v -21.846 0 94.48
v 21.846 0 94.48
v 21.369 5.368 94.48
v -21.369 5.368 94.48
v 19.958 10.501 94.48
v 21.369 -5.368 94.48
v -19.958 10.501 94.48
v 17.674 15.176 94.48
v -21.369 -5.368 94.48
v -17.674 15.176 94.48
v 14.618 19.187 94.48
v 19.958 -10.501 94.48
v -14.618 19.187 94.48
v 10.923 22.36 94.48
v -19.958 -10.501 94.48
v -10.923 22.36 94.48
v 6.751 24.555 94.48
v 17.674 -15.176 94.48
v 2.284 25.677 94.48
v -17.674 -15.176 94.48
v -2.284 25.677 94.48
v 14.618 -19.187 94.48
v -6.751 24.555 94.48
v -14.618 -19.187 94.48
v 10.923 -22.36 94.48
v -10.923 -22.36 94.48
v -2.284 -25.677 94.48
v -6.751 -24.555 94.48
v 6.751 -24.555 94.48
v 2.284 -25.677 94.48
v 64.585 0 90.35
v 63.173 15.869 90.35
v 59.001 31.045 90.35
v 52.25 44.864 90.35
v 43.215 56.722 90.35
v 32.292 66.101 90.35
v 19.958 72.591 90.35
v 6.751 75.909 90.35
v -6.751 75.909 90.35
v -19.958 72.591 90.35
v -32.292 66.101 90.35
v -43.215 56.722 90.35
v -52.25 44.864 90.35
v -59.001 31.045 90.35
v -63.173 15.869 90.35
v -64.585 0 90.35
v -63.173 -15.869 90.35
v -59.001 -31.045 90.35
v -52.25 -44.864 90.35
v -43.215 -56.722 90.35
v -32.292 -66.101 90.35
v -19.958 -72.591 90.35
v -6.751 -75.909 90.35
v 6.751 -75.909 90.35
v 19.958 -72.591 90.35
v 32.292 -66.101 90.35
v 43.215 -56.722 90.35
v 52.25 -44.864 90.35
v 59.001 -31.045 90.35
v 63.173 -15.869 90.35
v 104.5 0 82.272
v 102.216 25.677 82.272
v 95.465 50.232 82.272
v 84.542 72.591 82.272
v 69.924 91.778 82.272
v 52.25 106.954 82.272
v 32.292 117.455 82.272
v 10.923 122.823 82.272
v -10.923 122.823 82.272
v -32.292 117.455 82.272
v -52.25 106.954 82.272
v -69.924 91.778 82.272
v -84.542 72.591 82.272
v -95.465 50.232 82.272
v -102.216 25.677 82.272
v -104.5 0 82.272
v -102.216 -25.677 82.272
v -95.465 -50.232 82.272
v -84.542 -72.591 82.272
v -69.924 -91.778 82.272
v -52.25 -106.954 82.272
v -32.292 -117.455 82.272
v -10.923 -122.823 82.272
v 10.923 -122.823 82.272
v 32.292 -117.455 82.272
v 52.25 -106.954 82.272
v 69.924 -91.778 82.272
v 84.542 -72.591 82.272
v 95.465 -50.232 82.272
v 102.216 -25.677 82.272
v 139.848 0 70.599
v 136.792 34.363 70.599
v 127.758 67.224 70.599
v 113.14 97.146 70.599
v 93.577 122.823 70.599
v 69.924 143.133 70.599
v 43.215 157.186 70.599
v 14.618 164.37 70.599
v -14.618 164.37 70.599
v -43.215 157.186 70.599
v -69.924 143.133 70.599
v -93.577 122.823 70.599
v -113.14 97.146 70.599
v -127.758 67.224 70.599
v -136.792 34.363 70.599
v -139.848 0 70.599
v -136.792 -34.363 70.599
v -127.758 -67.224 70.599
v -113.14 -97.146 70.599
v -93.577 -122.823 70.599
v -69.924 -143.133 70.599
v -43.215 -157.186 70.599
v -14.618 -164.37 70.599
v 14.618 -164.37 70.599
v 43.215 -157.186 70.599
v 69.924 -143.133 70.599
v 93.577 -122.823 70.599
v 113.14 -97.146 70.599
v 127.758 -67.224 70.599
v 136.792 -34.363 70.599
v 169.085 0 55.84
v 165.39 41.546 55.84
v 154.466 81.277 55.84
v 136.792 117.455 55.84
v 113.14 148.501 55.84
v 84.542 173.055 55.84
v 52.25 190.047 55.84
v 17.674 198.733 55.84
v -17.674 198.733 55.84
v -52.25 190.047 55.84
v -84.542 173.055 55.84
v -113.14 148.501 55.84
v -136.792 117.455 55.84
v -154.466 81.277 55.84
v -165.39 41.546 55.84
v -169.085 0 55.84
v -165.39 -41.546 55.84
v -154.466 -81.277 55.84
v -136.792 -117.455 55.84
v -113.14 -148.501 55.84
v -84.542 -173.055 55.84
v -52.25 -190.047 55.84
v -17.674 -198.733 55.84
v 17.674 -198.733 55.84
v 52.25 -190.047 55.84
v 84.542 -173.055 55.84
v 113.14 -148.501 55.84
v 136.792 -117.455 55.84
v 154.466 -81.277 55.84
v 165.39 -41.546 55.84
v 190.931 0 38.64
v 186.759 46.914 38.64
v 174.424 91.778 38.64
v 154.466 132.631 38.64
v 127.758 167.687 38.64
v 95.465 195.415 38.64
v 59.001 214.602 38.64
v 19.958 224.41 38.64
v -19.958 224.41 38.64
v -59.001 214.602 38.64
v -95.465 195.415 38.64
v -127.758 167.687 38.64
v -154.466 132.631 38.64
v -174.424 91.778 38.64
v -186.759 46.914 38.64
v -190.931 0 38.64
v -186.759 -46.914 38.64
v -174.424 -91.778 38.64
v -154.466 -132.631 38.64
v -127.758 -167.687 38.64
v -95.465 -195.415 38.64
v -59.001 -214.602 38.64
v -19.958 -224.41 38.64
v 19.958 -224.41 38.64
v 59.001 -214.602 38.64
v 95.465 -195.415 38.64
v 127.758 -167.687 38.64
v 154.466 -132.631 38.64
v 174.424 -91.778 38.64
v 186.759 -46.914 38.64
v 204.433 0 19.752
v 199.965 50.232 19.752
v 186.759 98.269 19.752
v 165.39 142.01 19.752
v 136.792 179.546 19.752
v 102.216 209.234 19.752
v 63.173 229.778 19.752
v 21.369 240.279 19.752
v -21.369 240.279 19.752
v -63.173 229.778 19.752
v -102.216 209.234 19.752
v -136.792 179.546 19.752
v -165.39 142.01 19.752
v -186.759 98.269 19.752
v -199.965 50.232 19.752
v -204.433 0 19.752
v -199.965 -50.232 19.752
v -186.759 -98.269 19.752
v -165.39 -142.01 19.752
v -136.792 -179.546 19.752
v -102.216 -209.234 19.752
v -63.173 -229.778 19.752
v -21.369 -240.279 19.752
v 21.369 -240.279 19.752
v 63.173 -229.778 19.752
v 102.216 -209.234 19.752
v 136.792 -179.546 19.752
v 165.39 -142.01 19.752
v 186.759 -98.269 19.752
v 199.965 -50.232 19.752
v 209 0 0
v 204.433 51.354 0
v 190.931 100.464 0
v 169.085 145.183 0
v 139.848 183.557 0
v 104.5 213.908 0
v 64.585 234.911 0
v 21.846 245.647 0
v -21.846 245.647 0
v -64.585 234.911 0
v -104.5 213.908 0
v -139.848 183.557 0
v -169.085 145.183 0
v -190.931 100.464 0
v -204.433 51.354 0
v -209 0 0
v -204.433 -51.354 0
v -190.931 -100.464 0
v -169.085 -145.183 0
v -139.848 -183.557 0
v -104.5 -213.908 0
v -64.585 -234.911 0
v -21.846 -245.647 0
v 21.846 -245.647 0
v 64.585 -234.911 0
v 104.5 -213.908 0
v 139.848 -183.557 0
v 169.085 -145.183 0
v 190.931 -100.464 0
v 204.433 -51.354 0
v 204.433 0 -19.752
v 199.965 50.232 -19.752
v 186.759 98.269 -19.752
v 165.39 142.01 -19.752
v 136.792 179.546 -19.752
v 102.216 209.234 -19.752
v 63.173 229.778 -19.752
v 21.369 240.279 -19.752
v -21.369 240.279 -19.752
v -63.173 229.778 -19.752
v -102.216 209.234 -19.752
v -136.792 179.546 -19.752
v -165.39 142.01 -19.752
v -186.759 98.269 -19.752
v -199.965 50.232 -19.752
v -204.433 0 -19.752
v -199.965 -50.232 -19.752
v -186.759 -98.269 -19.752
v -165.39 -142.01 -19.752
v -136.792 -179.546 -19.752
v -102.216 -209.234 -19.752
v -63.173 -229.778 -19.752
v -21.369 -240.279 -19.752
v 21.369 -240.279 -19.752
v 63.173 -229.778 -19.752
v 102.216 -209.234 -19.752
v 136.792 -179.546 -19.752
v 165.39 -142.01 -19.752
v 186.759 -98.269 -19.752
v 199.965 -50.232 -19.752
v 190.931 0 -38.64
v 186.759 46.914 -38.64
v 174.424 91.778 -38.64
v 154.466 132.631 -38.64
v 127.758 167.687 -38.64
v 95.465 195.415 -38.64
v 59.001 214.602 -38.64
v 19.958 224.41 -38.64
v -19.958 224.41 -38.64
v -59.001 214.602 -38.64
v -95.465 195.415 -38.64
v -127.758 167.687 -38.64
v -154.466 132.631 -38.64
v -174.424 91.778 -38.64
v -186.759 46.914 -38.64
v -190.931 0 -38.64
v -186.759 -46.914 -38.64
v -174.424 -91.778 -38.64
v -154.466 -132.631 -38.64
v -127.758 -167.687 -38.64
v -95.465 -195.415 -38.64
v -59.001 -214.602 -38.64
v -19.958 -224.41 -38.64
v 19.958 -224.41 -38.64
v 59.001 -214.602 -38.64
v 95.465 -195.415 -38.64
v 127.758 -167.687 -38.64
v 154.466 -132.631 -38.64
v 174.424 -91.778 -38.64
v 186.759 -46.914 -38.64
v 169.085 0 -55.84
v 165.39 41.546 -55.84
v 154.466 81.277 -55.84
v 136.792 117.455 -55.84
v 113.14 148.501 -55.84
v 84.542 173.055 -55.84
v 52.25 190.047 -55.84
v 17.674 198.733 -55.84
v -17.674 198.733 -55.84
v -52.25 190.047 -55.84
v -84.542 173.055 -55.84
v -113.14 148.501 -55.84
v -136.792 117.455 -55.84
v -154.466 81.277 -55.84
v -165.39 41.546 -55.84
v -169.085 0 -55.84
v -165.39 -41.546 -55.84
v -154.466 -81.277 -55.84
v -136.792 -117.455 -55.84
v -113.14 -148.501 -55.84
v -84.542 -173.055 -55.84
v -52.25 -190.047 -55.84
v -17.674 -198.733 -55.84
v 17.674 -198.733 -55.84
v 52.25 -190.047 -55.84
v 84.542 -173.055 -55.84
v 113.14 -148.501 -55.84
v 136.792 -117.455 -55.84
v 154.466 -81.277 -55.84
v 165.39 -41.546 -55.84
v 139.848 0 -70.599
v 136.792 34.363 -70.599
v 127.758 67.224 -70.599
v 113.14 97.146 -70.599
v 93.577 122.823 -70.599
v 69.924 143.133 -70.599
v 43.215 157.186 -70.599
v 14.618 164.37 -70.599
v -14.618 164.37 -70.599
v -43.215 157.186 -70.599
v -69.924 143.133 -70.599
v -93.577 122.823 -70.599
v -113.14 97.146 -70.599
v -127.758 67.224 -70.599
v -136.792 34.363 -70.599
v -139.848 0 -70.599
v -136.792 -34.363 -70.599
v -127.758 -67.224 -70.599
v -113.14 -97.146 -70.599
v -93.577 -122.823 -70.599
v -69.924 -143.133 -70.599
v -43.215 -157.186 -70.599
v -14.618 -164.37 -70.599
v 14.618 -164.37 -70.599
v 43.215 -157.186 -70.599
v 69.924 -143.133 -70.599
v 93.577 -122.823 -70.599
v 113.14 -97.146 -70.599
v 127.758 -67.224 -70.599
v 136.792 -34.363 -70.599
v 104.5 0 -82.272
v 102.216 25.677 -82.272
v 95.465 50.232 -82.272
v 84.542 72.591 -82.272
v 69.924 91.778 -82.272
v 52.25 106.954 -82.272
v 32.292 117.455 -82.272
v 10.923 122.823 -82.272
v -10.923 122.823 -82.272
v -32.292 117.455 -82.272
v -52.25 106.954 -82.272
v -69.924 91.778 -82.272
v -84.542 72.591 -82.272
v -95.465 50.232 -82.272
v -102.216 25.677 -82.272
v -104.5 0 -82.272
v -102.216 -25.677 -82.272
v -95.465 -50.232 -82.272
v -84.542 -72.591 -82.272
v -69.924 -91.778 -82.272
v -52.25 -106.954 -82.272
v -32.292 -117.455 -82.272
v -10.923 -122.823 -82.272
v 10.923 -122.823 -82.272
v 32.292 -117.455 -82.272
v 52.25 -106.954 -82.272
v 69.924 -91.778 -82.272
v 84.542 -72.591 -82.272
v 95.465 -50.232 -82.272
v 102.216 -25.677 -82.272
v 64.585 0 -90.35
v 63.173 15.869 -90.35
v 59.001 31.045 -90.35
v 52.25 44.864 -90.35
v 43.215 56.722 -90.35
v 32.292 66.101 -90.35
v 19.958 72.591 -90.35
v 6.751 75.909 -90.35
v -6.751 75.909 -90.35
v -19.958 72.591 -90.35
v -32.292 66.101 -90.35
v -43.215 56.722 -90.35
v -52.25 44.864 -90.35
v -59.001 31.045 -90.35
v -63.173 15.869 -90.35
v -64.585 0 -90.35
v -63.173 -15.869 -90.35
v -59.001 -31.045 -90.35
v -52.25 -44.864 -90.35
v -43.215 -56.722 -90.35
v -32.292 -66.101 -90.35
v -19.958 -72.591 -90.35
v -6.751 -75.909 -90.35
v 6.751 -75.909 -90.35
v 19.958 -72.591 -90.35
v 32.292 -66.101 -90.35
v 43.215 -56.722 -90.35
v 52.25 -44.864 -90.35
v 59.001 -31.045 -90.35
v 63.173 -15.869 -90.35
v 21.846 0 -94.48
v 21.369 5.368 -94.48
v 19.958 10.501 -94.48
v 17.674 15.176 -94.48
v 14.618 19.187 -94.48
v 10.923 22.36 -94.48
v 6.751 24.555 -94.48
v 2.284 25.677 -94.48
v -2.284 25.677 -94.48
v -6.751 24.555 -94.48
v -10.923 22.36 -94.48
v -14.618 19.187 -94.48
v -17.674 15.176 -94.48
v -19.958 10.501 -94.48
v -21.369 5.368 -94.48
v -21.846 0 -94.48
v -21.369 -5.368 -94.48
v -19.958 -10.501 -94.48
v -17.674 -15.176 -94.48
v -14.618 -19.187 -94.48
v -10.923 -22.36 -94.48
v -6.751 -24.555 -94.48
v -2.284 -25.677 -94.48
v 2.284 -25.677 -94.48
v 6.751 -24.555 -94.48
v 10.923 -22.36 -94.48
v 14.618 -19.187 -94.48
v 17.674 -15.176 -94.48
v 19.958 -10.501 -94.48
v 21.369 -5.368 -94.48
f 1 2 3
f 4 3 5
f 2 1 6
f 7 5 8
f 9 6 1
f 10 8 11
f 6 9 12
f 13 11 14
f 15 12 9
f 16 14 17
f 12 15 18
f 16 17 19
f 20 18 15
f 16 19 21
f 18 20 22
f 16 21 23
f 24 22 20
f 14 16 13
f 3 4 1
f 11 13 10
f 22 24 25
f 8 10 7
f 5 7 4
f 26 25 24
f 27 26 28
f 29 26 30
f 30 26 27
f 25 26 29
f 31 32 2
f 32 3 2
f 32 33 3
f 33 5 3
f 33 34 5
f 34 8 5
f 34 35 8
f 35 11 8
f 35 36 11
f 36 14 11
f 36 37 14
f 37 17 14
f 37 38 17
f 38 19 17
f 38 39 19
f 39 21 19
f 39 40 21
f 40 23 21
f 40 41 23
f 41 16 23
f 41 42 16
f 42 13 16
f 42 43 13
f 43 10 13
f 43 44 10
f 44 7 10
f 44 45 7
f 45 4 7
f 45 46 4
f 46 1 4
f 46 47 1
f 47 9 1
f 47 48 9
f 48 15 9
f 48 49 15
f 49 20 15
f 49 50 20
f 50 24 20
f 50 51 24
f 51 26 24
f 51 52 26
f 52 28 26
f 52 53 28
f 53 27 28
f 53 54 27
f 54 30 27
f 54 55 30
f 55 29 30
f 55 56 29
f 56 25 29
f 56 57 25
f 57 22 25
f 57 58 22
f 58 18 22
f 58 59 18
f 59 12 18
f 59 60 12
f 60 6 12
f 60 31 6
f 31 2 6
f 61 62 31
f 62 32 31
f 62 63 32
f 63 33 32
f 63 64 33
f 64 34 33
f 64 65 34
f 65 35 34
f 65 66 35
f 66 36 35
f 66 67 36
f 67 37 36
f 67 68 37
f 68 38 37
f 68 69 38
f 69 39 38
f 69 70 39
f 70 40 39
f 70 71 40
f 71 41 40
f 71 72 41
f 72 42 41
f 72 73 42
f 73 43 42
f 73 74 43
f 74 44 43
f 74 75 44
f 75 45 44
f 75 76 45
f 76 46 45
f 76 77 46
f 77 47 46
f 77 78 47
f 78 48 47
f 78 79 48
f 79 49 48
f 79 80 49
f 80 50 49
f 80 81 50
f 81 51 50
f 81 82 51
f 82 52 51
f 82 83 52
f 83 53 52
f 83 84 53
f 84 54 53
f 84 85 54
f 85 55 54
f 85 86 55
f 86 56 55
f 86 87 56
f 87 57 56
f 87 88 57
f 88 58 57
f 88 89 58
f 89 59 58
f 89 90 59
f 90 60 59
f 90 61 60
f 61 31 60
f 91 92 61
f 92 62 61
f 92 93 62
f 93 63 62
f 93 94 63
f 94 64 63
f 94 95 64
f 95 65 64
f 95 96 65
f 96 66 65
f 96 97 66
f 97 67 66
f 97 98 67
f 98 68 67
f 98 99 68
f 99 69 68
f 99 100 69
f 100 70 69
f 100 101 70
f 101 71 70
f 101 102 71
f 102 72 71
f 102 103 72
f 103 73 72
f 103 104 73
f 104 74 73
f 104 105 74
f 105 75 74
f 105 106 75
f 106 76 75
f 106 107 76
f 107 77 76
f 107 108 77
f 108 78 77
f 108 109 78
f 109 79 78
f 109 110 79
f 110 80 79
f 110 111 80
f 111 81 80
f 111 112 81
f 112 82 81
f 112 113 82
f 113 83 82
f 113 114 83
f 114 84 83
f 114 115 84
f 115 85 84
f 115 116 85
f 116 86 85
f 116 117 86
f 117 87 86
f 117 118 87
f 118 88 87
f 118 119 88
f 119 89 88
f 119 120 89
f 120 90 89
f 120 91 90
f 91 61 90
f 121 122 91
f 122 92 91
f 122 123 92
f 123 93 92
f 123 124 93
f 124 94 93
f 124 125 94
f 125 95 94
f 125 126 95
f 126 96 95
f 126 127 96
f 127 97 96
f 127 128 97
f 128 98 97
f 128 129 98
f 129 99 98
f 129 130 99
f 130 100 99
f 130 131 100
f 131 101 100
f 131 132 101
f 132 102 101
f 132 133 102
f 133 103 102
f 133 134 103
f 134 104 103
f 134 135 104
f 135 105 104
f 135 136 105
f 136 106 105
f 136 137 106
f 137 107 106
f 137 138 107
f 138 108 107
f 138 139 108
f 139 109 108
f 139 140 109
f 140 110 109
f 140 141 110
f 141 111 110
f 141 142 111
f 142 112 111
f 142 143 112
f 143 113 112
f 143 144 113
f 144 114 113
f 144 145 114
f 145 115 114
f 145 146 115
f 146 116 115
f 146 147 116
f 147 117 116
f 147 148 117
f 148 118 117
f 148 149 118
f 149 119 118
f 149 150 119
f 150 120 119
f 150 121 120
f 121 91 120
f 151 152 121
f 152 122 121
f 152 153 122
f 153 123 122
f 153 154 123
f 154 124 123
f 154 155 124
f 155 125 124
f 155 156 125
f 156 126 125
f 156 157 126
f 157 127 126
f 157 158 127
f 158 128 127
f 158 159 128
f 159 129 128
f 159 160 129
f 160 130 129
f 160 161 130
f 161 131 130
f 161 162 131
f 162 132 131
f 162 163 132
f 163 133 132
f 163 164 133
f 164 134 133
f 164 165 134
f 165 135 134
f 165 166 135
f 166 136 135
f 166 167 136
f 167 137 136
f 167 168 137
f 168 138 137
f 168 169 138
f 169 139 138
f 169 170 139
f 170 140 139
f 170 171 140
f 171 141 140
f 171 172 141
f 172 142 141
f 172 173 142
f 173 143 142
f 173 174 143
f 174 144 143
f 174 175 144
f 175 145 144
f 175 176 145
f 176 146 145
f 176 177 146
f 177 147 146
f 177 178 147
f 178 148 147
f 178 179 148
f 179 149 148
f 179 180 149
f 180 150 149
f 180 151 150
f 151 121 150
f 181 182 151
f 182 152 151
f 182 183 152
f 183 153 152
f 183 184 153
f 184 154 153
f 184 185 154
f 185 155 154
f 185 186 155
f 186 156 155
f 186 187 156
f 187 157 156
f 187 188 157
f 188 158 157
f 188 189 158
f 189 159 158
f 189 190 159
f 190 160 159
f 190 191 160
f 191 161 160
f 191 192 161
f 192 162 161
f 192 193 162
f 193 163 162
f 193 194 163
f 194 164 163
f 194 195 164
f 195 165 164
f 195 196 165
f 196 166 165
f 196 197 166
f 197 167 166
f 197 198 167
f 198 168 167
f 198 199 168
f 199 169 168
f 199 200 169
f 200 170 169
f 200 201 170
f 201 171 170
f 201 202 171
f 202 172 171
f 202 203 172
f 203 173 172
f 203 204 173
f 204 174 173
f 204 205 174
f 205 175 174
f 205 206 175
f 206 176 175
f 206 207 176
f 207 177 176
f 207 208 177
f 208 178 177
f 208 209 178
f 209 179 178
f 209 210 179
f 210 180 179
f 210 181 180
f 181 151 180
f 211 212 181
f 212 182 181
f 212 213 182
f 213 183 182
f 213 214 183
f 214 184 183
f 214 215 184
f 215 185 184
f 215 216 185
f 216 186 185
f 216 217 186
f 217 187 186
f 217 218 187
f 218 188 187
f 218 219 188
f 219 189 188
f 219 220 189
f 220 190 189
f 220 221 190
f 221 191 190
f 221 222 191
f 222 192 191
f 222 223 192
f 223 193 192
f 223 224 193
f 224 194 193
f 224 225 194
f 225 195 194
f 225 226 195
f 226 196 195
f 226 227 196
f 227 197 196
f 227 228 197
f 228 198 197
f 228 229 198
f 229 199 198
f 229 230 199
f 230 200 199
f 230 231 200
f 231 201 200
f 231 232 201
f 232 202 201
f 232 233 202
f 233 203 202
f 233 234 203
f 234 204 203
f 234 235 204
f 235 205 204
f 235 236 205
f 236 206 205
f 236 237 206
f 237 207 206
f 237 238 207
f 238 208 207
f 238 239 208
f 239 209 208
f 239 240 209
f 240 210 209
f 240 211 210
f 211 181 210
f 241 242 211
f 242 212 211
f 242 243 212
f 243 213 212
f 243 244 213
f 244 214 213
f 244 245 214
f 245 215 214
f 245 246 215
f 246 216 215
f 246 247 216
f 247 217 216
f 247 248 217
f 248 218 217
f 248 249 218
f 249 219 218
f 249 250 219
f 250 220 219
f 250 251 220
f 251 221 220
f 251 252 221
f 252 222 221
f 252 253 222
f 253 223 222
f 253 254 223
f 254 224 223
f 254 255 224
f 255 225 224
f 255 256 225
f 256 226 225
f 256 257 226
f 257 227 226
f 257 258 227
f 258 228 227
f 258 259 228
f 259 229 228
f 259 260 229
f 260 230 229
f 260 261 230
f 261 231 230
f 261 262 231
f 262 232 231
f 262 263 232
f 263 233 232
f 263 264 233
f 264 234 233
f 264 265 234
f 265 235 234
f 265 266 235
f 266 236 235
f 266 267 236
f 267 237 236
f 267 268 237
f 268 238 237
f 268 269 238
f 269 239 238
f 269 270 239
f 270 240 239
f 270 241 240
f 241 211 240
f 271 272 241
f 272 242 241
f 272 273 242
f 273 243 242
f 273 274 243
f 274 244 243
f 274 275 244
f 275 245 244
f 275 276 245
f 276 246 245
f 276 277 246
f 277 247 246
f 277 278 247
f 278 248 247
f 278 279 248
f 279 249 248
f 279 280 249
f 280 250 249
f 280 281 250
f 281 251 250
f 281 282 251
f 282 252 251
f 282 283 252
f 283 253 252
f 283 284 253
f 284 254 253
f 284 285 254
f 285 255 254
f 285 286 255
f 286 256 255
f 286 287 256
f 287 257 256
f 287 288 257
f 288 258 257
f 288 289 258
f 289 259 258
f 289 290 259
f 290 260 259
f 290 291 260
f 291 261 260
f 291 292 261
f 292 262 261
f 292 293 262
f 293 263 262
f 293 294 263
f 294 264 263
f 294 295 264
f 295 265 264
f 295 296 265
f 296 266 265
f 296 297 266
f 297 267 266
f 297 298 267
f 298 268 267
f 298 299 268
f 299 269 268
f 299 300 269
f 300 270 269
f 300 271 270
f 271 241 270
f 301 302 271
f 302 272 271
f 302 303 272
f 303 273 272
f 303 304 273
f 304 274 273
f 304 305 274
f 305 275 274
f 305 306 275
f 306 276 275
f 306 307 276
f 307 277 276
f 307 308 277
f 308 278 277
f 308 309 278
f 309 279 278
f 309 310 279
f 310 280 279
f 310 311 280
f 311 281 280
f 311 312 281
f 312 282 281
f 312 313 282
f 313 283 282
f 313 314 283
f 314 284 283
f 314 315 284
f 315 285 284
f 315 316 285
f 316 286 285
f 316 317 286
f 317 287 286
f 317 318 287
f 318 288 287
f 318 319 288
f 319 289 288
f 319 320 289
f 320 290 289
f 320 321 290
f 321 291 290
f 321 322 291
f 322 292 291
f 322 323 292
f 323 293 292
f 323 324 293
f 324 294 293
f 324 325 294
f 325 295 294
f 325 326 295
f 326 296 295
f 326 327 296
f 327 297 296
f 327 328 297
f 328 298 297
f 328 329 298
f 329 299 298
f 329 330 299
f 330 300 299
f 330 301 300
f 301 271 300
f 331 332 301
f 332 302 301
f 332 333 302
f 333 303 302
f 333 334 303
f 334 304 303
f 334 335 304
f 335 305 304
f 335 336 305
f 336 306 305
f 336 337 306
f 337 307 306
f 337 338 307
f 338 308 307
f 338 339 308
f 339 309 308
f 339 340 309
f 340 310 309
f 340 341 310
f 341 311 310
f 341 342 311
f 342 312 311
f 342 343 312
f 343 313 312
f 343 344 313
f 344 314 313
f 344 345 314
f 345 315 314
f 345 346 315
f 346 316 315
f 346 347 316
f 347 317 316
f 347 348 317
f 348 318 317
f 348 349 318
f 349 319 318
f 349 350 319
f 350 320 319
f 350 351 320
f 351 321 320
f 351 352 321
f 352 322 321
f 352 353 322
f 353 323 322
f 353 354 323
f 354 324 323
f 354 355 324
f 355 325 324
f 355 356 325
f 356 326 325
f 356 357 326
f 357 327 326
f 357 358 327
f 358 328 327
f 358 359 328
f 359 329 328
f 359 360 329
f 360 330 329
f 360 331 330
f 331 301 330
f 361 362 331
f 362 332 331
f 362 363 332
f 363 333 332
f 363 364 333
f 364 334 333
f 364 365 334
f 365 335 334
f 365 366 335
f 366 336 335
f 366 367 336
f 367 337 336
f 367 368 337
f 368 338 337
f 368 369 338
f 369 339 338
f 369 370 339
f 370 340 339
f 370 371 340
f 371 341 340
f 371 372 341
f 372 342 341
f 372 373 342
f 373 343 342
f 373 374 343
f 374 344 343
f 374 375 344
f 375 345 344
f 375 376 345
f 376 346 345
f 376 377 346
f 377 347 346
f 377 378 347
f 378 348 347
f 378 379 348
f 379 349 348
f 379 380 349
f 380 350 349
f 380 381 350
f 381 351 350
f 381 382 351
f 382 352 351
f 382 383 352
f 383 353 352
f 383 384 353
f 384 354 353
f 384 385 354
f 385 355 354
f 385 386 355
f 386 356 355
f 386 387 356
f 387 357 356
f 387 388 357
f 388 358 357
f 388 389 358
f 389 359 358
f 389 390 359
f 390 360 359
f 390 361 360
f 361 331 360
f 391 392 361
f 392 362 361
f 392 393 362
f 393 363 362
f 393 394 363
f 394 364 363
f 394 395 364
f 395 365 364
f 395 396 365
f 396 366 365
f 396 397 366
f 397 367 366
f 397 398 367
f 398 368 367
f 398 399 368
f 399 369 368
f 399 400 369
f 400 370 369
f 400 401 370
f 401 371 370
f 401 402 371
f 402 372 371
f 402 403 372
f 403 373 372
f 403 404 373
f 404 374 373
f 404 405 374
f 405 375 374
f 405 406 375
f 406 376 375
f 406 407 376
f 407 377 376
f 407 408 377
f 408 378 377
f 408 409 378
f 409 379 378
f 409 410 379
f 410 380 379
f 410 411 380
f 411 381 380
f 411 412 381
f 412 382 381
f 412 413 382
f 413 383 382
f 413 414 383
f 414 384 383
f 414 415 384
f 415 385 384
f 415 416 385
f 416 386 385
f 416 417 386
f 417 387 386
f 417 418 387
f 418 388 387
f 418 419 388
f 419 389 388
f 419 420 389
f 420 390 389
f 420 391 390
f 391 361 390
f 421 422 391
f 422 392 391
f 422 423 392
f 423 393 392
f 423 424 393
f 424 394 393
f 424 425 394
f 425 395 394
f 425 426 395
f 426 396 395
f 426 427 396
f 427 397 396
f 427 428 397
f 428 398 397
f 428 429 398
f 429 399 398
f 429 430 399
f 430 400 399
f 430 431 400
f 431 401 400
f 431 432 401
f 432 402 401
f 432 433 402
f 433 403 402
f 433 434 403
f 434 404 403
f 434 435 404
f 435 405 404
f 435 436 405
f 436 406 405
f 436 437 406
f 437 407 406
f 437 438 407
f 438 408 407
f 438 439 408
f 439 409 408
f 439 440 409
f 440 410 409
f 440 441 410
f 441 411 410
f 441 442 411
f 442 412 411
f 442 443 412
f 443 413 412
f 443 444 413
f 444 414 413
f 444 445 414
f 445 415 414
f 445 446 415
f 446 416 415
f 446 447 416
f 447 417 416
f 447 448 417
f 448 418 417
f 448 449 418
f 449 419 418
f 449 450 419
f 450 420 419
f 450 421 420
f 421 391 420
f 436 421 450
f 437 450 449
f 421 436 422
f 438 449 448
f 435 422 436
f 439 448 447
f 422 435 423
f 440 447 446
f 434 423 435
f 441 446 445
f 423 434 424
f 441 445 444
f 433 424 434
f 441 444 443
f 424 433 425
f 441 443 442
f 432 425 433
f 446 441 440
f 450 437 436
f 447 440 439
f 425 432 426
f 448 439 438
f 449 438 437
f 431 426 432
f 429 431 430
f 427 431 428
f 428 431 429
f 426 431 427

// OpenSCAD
// Generated by SolidPython 1.0.1 on 2020-07-29 00:46:49


scale(v = [11, 13, 5]) {
	sphere(r = 19);
}
/***********************************************
*********      SolidPython code:      **********
************************************************
 
# import packages: SolidPython
from solid import *
from solid.utils import *
from itertools import chain, combinations, permutations


class Resize:

    def __init__(self, scad_file):
        self.scad_file = scad_file
        #self.scad_file = import_scad(scad_file)
        # cone/cylinder param:
        self.r1 = 0
        self.r2 = 0
        self.h = 0
        # rectangular prism param:
        self.w = 0
        self.l = 0
        # ellipse param:
        self.r = 0

    # import OpenScad code (file name corresponds to shape)


    # classify shape + parameters
    def assign(self, param1, param2, param3):
        if self.scad_file == 'cone.scad':
            self.r1 = param1
            self.r2 = param2
            self.h = param3
        elif self.scad_file == 'cylinder.scad':
            self.r1 = param1
            self.r2 = param2
            self.h = param3
        elif self.scad_file == 'rectangularPrism.scad':
            self.h = param1
            self.l = param2
            self.w = param3
        else:
            self.r = param1
            self.h = param2

    # resize parameters
    def iterate(self):
        x = range(3, 20, 2)
        i = 1
        if self.scad_file == 'cone.scad':
            tempList = list(permutations(x, 2))
            for temp in tempList:
                param1 = temp[0]
                param2 = temp[1]
                filepath = 'produced_scad_files/' + 'cone' + str(param1) + '_' + str(param2) + '_' + '.scad'
                scad_render_to_file(cylinder(h=param1, r1=param2, r2=0), filepath)

        elif self.scad_file == 'cylinder.scad':
            tempList = list(permutations(x, 3))
            for temp in tempList:
                param1 = temp[0]
                param2 = temp[1]
                filepath = 'produced_scad_files/' + 'cylinder' + str(param1) + '_' + str(param2) + '_' + '.scad'
                scad_render_to_file(cylinder(h=param1, r1=param2, r2=param2), filepath)

        elif self.scad_file == 'rectangularPrism.scad':
            tempList = list(permutations(x, 3))
            for temp in tempList:
                param1 = temp[0]
                param2 = temp[1]
                param3 = temp[2]
                filepath = 'produced_scad_files/' + 'rectangularPrism' + str(param1) + '_' + str(param2) + '_' + str(
                    param3) + '.scad'
                scad_render_to_file(cube(size=(param1, param2, param3)), filepath)

        elif self.scad_file == 'ellipse.scad':
            tempList = list(permutations(x, 4))
            for temp in tempList:
                param1 = temp[0]
                param2 = temp[1]
                param3 = temp[2]
                param4 = temp[3]
                filepath = 'produced_scad_files/' + 'ellipse' + str(param1) + '_' + str(param2) + '_' + str(param3) + '_' + str(param4) + '.scad'
                scad_render_to_file(scale([param1, param2, param3])(sphere(r=param4)), filepath)

    def render_to_scadfile(self):
        scad_render_to_file(scad, 'example.scad') 
 
************************************************/
